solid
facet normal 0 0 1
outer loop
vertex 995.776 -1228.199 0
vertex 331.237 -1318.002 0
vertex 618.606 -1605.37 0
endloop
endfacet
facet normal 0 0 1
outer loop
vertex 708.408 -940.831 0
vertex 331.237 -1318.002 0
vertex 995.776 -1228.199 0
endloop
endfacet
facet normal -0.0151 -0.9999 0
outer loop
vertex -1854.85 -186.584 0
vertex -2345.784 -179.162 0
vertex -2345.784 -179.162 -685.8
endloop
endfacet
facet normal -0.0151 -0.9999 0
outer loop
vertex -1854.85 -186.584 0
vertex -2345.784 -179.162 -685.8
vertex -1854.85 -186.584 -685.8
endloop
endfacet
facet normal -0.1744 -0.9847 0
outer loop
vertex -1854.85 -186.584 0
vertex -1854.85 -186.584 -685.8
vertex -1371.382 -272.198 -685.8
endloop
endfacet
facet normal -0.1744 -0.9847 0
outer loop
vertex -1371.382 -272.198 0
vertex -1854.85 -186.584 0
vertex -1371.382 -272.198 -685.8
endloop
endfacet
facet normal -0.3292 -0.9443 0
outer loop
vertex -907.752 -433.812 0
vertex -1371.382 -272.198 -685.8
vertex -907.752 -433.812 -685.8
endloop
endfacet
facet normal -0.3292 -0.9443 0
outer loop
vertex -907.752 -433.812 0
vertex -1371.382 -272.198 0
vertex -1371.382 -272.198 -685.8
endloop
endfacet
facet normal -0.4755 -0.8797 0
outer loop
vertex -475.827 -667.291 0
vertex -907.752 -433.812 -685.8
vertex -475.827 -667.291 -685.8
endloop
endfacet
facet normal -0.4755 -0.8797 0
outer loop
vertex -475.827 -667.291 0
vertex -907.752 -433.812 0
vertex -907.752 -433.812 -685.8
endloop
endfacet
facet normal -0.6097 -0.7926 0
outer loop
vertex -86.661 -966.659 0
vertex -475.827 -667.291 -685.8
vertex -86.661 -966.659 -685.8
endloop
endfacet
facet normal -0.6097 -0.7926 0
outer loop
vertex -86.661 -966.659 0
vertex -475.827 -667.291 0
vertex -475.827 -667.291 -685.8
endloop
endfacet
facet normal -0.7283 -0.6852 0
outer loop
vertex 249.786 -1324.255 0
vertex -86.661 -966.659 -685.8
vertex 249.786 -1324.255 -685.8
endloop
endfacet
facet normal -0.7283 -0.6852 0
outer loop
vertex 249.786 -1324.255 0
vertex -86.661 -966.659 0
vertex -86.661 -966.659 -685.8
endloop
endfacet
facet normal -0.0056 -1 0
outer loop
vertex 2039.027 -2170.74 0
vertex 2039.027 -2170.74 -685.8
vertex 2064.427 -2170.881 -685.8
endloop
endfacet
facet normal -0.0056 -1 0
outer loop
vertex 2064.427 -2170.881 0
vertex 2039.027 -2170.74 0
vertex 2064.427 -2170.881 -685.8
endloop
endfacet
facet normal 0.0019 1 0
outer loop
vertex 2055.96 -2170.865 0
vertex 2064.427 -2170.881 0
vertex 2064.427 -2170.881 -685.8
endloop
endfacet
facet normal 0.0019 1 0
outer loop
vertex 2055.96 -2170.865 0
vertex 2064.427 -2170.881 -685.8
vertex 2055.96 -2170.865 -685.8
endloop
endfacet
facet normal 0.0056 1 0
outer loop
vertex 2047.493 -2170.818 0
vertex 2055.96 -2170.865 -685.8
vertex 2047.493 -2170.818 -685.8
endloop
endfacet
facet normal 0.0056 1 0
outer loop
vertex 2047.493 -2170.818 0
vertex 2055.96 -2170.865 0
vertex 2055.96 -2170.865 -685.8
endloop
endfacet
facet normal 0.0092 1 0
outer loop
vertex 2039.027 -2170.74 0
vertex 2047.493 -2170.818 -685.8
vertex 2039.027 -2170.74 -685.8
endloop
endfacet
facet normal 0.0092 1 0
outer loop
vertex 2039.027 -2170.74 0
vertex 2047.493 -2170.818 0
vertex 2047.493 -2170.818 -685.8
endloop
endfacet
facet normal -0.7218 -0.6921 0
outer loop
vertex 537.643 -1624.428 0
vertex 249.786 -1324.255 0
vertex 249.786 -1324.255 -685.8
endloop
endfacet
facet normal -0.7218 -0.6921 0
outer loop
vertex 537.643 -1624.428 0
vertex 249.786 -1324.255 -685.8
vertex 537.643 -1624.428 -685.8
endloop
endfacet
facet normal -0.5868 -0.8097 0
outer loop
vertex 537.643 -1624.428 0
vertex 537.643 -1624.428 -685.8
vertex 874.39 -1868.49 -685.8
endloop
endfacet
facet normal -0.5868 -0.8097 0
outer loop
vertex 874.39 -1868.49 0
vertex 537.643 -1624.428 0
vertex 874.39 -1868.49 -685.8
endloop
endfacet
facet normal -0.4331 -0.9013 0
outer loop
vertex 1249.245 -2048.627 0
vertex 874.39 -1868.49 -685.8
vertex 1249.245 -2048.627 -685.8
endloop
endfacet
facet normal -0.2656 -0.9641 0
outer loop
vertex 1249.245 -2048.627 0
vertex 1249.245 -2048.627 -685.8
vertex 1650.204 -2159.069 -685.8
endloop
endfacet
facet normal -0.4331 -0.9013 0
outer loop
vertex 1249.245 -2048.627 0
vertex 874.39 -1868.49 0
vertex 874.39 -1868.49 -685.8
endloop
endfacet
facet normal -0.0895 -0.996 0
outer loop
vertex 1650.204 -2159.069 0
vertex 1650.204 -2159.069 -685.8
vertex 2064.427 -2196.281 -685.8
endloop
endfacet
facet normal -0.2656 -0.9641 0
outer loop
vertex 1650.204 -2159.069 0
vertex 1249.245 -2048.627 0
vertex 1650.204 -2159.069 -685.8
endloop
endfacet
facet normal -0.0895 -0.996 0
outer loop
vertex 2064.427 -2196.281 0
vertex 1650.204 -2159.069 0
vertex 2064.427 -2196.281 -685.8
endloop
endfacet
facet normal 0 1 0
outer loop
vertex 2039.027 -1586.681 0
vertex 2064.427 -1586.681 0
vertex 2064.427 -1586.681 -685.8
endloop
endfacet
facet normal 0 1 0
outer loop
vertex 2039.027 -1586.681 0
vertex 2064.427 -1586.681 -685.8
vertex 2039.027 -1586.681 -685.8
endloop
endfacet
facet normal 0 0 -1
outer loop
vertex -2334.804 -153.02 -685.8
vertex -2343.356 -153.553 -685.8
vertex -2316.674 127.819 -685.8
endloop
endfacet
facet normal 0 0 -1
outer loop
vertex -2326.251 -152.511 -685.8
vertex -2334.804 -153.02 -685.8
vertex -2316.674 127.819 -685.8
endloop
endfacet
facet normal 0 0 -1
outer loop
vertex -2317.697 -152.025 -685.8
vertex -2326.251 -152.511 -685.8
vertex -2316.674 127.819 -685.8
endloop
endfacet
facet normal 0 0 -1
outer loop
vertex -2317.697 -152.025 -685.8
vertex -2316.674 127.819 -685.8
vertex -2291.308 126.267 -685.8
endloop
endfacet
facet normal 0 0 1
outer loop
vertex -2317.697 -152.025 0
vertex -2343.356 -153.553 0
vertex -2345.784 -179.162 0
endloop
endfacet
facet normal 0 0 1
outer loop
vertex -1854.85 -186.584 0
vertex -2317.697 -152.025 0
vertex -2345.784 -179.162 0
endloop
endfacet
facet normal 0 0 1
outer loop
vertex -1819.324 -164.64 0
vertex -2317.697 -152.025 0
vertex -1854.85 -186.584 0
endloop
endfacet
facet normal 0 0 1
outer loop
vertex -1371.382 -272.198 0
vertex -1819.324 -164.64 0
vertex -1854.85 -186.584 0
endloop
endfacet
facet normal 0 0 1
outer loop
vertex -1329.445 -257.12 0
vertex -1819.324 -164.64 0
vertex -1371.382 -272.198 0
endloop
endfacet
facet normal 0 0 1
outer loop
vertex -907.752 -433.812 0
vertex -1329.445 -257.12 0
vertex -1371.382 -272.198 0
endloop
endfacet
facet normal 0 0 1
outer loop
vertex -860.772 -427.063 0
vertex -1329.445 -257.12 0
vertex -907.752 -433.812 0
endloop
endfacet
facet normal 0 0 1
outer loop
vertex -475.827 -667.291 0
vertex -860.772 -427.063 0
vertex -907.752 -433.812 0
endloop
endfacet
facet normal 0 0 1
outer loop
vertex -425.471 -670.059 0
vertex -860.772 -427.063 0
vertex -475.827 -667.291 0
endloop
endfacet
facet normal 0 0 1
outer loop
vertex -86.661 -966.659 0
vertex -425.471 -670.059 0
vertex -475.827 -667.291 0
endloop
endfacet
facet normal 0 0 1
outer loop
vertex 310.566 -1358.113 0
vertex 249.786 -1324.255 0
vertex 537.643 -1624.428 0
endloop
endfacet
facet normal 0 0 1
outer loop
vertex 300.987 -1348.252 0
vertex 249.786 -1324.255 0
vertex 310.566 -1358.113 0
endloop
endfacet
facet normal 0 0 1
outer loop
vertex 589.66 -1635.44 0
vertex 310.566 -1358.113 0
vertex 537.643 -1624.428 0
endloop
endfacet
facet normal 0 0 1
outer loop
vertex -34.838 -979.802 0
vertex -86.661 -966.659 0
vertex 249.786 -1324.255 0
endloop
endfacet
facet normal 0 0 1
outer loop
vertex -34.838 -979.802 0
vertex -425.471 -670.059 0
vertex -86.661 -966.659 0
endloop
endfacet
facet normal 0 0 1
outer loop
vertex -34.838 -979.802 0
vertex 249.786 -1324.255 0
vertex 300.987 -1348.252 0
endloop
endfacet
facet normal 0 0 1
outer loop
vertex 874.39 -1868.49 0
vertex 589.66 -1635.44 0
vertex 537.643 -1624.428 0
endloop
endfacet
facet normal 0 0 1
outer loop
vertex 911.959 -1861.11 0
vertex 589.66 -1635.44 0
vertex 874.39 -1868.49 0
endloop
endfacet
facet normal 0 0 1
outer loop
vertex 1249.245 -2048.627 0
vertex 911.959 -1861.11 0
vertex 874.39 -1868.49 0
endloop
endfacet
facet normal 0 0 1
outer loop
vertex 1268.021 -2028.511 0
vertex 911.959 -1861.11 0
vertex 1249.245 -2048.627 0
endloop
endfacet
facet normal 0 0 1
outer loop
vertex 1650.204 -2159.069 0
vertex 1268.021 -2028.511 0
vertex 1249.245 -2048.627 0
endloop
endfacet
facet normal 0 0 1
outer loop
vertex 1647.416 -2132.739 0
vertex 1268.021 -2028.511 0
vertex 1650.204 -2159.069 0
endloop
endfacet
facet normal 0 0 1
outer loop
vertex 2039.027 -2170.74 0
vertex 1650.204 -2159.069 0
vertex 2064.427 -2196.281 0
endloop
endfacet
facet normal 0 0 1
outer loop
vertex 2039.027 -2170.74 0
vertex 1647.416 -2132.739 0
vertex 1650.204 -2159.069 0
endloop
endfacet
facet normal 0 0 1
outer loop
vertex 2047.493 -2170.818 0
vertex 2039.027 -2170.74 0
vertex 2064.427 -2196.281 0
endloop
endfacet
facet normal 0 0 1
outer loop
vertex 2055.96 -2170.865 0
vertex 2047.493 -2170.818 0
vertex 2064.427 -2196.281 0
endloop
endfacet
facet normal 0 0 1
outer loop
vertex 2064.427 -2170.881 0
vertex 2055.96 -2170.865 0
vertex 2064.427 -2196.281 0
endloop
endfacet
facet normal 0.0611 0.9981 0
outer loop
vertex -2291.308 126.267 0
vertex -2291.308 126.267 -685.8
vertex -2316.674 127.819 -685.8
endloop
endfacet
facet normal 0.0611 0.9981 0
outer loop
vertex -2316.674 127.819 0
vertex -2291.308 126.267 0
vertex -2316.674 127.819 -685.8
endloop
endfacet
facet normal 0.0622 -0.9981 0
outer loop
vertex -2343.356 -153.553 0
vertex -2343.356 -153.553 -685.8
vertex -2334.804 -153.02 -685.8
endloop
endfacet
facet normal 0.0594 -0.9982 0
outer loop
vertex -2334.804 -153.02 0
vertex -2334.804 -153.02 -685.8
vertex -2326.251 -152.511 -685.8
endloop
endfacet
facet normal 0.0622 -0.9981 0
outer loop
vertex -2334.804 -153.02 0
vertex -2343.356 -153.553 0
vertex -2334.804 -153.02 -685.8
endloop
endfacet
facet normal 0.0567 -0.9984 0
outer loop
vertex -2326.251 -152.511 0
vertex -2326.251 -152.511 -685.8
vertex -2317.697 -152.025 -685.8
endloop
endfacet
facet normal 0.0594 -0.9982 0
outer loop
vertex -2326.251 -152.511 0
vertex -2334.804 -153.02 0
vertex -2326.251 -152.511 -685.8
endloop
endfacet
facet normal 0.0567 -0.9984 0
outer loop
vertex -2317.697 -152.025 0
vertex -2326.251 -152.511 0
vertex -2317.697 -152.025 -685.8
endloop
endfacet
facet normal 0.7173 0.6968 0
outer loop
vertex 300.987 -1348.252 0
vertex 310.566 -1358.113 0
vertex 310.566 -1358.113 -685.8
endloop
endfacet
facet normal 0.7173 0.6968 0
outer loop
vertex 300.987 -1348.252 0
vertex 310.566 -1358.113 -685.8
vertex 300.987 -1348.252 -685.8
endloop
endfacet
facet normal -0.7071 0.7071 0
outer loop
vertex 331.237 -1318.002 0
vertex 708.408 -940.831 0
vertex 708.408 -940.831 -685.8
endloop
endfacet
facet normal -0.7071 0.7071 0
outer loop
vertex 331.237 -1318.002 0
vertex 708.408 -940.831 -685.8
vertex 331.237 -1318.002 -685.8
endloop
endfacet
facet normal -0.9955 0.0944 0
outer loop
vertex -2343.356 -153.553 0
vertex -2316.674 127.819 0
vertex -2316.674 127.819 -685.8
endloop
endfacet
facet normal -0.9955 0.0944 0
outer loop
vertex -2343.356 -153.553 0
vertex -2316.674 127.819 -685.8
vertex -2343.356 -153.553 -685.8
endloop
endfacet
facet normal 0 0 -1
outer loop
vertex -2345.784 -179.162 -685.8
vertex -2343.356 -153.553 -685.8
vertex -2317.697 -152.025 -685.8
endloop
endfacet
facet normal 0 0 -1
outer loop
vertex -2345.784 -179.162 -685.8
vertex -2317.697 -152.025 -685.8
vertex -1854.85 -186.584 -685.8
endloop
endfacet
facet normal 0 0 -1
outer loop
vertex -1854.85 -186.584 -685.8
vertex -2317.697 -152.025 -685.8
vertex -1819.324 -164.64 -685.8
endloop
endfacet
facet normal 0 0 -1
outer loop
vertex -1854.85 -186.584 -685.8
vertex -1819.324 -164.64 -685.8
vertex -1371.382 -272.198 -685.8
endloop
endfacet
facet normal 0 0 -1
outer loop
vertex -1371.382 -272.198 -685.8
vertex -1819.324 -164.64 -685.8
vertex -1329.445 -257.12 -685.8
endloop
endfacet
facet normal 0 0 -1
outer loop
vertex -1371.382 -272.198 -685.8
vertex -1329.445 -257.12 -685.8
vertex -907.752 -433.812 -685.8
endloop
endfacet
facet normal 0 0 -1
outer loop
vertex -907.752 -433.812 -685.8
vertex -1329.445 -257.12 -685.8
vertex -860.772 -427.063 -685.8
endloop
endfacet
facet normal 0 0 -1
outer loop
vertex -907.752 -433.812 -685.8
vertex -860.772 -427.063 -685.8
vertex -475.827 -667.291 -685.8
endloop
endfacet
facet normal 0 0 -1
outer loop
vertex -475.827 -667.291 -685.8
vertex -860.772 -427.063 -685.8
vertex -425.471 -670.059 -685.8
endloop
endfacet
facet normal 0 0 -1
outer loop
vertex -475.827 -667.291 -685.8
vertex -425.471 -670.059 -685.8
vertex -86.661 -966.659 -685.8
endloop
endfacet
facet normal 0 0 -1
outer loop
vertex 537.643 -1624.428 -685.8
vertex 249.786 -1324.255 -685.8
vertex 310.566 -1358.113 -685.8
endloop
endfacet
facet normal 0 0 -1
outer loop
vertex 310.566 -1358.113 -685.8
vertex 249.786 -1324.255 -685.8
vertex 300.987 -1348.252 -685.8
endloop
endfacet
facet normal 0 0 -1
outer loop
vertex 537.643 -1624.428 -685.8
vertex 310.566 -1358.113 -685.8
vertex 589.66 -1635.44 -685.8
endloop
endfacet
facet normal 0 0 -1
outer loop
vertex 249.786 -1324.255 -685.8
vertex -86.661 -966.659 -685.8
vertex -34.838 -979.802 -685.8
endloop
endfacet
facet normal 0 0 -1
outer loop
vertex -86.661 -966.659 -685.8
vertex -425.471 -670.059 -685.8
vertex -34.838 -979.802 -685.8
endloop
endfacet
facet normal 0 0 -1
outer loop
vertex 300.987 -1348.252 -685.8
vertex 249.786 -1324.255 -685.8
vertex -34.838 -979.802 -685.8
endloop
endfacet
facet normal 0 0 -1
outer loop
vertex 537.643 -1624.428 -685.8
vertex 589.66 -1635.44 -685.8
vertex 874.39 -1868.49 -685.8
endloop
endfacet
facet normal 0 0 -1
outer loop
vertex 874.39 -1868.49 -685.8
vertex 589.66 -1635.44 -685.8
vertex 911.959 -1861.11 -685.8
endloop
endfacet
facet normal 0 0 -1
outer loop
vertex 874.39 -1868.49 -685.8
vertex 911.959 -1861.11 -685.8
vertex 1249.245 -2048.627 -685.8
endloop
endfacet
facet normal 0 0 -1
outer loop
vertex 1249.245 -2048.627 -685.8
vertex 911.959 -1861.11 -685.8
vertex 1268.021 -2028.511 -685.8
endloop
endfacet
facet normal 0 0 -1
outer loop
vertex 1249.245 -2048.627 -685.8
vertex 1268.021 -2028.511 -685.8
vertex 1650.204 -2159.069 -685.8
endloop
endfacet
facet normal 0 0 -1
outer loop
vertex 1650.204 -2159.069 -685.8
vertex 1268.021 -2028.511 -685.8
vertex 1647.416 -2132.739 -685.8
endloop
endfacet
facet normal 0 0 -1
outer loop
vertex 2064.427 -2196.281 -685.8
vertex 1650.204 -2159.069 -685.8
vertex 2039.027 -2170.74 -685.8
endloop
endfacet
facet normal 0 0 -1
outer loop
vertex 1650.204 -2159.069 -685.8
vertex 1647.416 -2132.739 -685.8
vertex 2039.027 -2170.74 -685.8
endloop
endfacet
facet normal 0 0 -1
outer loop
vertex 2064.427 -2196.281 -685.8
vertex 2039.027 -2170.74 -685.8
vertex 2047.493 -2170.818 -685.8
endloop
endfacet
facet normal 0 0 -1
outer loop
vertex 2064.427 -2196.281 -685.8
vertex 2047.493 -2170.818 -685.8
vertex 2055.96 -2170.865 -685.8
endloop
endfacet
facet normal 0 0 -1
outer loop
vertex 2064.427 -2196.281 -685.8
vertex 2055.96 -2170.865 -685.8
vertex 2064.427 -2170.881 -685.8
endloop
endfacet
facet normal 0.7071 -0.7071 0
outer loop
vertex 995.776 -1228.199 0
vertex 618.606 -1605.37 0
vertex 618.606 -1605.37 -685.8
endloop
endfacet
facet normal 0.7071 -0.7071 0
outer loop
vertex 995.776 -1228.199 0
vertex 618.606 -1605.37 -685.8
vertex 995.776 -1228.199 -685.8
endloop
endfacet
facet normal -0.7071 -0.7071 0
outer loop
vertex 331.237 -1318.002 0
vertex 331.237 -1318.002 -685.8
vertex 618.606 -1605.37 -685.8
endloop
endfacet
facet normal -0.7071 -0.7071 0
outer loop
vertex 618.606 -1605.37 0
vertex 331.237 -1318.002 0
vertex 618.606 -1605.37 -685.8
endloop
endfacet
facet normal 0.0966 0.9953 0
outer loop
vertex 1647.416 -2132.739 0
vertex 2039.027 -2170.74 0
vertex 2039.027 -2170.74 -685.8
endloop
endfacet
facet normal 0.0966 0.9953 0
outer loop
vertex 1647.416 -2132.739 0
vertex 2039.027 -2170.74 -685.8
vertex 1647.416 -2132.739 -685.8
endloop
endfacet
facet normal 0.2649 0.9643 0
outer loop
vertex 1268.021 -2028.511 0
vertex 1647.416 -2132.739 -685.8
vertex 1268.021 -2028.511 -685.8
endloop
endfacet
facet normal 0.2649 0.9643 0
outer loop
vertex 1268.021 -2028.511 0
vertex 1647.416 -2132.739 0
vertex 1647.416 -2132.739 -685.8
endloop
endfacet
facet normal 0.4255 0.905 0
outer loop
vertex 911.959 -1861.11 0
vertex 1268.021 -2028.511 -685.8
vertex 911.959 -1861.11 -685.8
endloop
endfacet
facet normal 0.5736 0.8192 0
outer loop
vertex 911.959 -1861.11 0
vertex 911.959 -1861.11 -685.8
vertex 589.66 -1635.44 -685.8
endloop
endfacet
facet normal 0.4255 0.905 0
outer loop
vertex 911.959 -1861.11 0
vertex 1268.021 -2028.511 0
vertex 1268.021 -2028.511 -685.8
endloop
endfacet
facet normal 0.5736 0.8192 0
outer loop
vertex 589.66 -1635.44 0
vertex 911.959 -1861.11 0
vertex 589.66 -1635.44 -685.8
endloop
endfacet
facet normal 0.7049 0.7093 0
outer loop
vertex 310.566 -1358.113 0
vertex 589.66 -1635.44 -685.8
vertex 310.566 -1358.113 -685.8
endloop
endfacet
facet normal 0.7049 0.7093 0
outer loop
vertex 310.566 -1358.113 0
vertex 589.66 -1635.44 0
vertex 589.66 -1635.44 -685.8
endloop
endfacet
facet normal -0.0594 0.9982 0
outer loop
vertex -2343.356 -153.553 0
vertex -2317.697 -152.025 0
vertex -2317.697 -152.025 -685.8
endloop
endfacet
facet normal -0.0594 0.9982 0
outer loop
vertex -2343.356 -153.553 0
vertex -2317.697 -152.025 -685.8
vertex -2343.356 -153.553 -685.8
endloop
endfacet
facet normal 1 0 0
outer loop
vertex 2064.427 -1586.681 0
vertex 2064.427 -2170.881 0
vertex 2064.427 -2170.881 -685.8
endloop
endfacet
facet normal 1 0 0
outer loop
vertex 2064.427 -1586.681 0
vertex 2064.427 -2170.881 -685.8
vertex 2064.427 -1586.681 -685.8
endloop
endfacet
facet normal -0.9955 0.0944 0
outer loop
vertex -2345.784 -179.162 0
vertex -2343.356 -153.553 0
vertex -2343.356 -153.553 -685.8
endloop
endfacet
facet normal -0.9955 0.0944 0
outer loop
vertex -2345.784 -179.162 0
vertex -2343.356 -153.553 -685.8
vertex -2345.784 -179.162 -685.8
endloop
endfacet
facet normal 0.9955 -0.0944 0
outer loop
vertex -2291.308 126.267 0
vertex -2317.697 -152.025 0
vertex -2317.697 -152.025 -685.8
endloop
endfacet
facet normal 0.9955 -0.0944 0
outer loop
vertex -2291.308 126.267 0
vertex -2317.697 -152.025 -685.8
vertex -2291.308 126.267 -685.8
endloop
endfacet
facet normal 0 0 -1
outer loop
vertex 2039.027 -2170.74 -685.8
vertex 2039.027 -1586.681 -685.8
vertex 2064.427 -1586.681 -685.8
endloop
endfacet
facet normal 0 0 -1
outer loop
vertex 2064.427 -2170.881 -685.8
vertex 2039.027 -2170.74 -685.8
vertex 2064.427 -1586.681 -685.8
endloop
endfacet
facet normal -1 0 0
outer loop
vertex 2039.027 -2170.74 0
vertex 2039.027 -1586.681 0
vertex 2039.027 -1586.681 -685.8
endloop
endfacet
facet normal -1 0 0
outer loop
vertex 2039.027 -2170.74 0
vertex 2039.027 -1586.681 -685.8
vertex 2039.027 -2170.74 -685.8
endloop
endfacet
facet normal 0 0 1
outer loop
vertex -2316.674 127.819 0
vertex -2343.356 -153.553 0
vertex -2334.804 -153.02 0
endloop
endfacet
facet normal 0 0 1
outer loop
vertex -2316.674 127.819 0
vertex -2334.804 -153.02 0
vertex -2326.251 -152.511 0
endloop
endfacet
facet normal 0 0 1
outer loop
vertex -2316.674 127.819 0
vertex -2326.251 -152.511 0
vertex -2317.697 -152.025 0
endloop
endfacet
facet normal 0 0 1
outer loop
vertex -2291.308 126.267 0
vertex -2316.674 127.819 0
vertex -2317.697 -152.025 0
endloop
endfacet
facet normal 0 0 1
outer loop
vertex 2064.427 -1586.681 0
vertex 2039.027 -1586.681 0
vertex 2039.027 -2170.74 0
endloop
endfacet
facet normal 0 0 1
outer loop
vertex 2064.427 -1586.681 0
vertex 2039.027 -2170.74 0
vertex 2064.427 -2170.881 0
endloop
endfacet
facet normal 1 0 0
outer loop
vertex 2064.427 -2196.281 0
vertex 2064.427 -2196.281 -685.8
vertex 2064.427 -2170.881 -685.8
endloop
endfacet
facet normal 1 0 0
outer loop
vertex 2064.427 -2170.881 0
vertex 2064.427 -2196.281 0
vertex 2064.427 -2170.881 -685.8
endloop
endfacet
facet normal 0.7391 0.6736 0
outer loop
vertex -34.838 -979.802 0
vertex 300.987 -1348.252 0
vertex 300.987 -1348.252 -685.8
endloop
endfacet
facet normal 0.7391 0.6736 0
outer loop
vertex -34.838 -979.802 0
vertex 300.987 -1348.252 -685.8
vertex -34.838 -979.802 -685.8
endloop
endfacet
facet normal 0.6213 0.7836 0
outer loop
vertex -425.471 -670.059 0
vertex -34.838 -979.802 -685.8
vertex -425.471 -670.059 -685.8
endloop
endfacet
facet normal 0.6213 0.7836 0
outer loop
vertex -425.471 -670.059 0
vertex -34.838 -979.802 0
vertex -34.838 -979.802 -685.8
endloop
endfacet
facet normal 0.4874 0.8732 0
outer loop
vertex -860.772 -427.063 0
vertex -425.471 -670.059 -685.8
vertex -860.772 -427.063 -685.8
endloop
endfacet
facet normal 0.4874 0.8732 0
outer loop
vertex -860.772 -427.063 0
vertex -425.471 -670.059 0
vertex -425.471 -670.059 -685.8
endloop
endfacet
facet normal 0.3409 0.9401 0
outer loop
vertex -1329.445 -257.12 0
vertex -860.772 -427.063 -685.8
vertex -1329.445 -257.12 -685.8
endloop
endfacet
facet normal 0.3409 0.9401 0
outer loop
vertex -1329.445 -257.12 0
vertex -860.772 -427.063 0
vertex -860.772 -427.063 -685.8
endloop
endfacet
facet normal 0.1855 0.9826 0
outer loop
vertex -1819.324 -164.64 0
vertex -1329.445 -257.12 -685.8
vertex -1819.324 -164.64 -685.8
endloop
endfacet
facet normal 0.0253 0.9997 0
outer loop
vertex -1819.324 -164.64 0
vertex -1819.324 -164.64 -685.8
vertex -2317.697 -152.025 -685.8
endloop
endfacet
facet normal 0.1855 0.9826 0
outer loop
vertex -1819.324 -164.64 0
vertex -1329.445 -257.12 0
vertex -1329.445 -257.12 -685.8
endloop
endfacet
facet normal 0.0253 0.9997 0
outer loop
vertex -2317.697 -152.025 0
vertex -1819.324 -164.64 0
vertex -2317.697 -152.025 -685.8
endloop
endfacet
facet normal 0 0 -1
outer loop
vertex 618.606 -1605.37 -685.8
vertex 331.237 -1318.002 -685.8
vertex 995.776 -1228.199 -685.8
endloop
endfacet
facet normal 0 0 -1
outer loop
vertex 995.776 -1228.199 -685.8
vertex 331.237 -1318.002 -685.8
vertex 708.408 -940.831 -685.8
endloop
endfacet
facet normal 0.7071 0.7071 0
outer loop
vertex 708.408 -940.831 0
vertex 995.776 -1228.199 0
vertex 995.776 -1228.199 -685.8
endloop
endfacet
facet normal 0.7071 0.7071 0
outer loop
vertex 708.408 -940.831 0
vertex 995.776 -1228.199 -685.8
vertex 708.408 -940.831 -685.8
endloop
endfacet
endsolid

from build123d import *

# Parameters (mm, degrees)
F1_DEPTH = 685.8
F2_DEPTH = 685.8
F3_DEPTH = 685.8
F4_DEPTH = 685.8


with BuildPart() as f1:
    # F0 (on Top) → F1 (new body)
    with BuildSketch(Plane.XY):
        with BuildLine():
            Line((2064.4268335681, -2170.8805240781), (2064.4268335681, -1891.4805240781))
            ThreePointArc((2064.4268335681, -1891.4805240781), (2051.726582374, -1891.4405849964), (2039.0268335682, -1891.320769331))
            Line((2039.0268335681, -1891.320769331), (2039.0268335681, -2170.7401883026))
            Line((2039.0268335681, -2170.7401883026), (2064.4268335681, -2170.8805240781))
        make_face()
        with BuildLine():
            Line((2064.4268335681, -1891.4805240781), (2064.4268335681, -1586.6805240781))
            Line((2064.4268335681, -1586.6805240781), (2039.0268335681, -1586.6805240781))
            Line((2039.0268335681, -1586.6805240781), (2039.0268335681, -1891.320769331))
            ThreePointArc((2039.0268335682, -1891.320769331), (2051.726582374, -1891.4405849964), (2064.4268335681, -1891.4805240781))
        make_face()
    extrude(amount=-F1_DEPTH)


with BuildPart() as f2:
    # F0 (on Top) → F2 (new body)
    with BuildSketch(Plane.XY):
        with BuildLine():
            Line((-2317.6967938555, -152.0249940366), (-2343.3556362702, -153.5530842325))
            Line((-2343.3556362702, -153.5530842325), (-2345.7840120459, -179.1620260819))
            ThreePointArc((-2345.7840120459, -179.1620260819), (-907.7521586728, -433.8121667128), (249.7859527251, -1324.2546556476))
            ThreePointArc((249.7859527251, -1324.2546556476), (332.7689220118, -1422.2778395214), (421.0399634125, -1515.5673942338))
            Line((421.0399634125, -1515.5673942338), (439.0004756546, -1497.6068819916))
            ThreePointArc((439.0004756546, -1497.6068819916), (373.3444845796, -1429.1847562302), (310.5663609149, -1358.1129358871))
            Line((310.5663609149, -1358.1129358871), (300.9871304167, -1348.2520313553))
            ThreePointArc((300.9871304167, -1348.2520313553), (-860.7722517839, -427.062610277), (-2317.6967938555, -152.0249940366))
        make_face()
        with BuildLine():
            Line((439.0004756546, -1497.6068819916), (421.0399634125, -1515.5673942338))
            ThreePointArc((421.0399634125, -1515.5673942338), (1175.0322684085, -2019.3689455876), (2064.4268335681, -2196.2805240781))
            Line((2064.4268335681, -2196.2805240781), (2064.4268335681, -2170.8805240781))
            ThreePointArc((2064.4268335681, -2170.8805240781), (2051.7266397298, -2170.8454398665), (2039.0268335681, -2170.7401883026))
            ThreePointArc((2039.0268335681, -2170.7401883026), (1267.6469310258, -2028.3724164904), (589.0477069831, -1634.9278465373))
            ThreePointArc((589.0477069831, -1634.9278465373), (512.5045014265, -1567.9277826635), (439.0004756546, -1497.6068819916))
        make_face()
    extrude(amount=-F2_DEPTH)


with BuildPart() as f3:
    # F0 (on Top) → F3 (new body)
    with BuildSketch(Plane.XY):
        with BuildLine():
            Line((-2291.3076398854, 126.2673181521), (-2316.6743968408, 127.8194759219))
            Line((-2316.6743968408, 127.8194759219), (-2343.3556362702, -153.5530842325))
            ThreePointArc((-2343.3556362702, -153.5530842325), (-2330.5278016841, -152.7623974711), (-2317.6967938555, -152.0249940366))
            Line((-2317.6967938555, -152.0249940366), (-2291.3076398854, 126.2673181521))
        make_face()
    extrude(amount=-F3_DEPTH)


with BuildPart() as f4:
    # F0 (on Top) → F4 (new body)
    with BuildSketch(Plane.XY):
        with BuildLine():
            Line((636.5661103181, -1300.0412473281), (852.0922572238, -1084.5151004224))
            Line((852.0922572238, -1084.5151004224), (708.4081592867, -940.8310024853))
            Line((708.4081592867, -940.8310024853), (500.129795735, -1149.109366037))
            ThreePointArc((500.129795735, -1149.109366037), (566.4458173333, -1226.2947603965), (636.5661103182, -1300.0412473281))
        make_face()
        with BuildLine():
            Line((995.7763551609, -1228.1991983595), (852.0922572238, -1084.5151004224))
            Line((852.0922572238, -1084.5151004224), (636.5661103181, -1300.0412473281))
            ThreePointArc((636.5661103182, -1300.0412473281), (710.3125972498, -1370.161540313), (787.4979916092, -1436.4775619112))
            Line((787.4979916092, -1436.4775619112), (995.7763551609, -1228.1991983595))
        make_face()
        with BuildLine():
            ThreePointArc((636.5661103182, -1300.0412473281), (566.4458173333, -1226.2947603965), (500.129795735, -1149.109366037))
            Line((500.129795735, -1149.109366037), (331.2374022018, -1318.0017595702))
            Line((331.2374022018, -1318.0017595702), (474.9215001389, -1461.6858575073))
            Line((474.9215001389, -1461.6858575073), (636.5661103181, -1300.0412473281))
        make_face()
        with BuildLine():
            ThreePointArc((787.4979916092, -1436.4775619112), (710.3125972498, -1370.161540313), (636.5661103182, -1300.0412473281))
            Line((636.5661103181, -1300.0412473281), (474.9215001389, -1461.6858575073))
            Line((474.9215001389, -1461.6858575073), (618.605598076, -1605.3699554445))
            Line((618.605598076, -1605.3699554445), (787.4979916092, -1436.4775619112))
        make_face()
    extrude(amount=-F4_DEPTH)


solid = Compound([f1.part, f2.part, f3.part, f4.part])
